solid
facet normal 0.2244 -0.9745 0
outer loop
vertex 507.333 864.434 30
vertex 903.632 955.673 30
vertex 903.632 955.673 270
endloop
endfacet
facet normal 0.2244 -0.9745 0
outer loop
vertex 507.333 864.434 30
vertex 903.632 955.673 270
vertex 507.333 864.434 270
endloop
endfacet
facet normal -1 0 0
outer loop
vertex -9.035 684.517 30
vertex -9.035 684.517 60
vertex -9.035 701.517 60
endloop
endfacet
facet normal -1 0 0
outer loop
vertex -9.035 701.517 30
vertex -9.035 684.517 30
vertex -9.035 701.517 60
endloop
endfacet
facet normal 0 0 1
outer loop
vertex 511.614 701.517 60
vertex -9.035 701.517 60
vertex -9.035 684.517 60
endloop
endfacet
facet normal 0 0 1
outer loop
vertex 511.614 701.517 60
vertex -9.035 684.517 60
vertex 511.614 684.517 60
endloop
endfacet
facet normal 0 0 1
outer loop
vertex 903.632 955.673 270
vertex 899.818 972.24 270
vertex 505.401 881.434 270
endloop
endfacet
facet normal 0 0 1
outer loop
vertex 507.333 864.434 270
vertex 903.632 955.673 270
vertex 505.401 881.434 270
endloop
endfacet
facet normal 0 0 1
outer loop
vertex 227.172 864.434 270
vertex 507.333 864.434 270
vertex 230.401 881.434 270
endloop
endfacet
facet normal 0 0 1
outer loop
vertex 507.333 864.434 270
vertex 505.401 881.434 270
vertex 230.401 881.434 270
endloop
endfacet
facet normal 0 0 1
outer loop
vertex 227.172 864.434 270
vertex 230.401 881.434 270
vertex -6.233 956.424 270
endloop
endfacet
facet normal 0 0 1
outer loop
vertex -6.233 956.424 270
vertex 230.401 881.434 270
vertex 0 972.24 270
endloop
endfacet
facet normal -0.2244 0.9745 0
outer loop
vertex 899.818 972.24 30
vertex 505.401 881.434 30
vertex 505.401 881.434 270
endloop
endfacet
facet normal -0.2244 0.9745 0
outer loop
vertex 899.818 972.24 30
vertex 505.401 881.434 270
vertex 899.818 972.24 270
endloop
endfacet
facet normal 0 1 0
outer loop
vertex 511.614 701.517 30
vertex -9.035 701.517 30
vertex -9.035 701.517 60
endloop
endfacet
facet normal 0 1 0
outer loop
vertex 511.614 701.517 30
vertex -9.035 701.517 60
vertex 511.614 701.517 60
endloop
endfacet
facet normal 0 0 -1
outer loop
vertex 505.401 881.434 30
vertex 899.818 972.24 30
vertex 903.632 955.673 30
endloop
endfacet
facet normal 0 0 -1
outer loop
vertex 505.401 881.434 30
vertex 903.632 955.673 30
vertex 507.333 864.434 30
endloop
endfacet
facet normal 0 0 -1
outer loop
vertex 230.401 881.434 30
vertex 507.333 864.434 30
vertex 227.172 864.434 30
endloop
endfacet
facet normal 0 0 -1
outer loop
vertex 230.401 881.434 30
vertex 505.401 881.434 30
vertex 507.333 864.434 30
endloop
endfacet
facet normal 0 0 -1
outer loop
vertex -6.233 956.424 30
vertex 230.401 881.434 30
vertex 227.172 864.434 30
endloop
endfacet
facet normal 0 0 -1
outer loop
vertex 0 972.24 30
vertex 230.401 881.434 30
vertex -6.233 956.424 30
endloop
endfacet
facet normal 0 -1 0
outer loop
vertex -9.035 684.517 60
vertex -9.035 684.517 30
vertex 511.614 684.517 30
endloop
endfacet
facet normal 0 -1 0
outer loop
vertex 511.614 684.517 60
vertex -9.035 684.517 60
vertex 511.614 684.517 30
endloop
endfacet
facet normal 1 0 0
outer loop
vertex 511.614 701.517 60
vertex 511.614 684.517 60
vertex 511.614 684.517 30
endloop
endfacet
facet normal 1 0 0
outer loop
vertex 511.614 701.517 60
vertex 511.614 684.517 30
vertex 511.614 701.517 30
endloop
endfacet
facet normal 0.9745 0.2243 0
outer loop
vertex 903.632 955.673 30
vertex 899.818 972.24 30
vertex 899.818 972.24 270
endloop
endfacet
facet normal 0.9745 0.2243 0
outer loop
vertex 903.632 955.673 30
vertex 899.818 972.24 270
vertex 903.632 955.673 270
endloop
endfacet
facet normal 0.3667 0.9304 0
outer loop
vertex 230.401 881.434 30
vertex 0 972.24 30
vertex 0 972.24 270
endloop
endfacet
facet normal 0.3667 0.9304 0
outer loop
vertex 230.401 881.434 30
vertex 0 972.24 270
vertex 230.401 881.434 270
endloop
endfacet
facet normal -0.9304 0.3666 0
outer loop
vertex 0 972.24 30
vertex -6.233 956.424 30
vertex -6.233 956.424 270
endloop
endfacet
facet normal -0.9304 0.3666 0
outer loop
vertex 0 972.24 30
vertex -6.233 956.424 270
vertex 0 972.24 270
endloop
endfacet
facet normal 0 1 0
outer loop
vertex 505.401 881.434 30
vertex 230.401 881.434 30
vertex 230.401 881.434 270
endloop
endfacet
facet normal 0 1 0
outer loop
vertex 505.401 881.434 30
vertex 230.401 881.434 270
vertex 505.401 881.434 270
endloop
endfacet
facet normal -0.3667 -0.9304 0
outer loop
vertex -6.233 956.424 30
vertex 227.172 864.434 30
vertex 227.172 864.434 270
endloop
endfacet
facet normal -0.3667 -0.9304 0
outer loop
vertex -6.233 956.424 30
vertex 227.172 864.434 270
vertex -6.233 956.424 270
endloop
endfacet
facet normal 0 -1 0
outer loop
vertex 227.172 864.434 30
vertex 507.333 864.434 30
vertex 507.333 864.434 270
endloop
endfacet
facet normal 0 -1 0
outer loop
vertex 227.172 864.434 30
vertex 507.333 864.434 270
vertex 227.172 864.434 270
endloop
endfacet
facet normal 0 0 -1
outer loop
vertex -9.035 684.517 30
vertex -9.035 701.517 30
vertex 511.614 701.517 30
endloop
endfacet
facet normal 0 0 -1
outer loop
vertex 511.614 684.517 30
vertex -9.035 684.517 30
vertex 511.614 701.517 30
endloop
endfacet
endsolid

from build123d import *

# Parameters (mm, degrees)
ESBO_O1_W                = 520.649080511
ESBO_O1_H                = 17
RESSALTO_EXTRUS_O1_DEPTH = 30
RESSALTO_EXTRUS_O2_DEPTH = 240


with BuildPart() as part:
    # Esboço1 → Ressalto-extrusão1 (new body)
    with BuildSketch(Plane.XY.offset(30)):
        with Locations((251.289316527, 693.016670883)):
            Rectangle(ESBO_O1_W, ESBO_O1_H)
    extrude(amount=RESSALTO_EXTRUS_O1_DEPTH)


with BuildPart() as body_2:
    # Esboço2 → Ressalto-extrusão2 (new body)
    with BuildSketch(Plane.XY.offset(30)):
        Polygon((0, 972.240013316), (230.401177787, 881.434037576), (505.401177787, 881.434037576), (899.818171461, 972.240013316), (903.632275154, 955.673401924), (507.332852153, 864.434037576), (227.172021003, 864.434037576), (-6.233405118, 956.424051106), align=None)
    extrude(amount=RESSALTO_EXTRUS_O2_DEPTH)


solid = Compound([part.part, body_2.part])
